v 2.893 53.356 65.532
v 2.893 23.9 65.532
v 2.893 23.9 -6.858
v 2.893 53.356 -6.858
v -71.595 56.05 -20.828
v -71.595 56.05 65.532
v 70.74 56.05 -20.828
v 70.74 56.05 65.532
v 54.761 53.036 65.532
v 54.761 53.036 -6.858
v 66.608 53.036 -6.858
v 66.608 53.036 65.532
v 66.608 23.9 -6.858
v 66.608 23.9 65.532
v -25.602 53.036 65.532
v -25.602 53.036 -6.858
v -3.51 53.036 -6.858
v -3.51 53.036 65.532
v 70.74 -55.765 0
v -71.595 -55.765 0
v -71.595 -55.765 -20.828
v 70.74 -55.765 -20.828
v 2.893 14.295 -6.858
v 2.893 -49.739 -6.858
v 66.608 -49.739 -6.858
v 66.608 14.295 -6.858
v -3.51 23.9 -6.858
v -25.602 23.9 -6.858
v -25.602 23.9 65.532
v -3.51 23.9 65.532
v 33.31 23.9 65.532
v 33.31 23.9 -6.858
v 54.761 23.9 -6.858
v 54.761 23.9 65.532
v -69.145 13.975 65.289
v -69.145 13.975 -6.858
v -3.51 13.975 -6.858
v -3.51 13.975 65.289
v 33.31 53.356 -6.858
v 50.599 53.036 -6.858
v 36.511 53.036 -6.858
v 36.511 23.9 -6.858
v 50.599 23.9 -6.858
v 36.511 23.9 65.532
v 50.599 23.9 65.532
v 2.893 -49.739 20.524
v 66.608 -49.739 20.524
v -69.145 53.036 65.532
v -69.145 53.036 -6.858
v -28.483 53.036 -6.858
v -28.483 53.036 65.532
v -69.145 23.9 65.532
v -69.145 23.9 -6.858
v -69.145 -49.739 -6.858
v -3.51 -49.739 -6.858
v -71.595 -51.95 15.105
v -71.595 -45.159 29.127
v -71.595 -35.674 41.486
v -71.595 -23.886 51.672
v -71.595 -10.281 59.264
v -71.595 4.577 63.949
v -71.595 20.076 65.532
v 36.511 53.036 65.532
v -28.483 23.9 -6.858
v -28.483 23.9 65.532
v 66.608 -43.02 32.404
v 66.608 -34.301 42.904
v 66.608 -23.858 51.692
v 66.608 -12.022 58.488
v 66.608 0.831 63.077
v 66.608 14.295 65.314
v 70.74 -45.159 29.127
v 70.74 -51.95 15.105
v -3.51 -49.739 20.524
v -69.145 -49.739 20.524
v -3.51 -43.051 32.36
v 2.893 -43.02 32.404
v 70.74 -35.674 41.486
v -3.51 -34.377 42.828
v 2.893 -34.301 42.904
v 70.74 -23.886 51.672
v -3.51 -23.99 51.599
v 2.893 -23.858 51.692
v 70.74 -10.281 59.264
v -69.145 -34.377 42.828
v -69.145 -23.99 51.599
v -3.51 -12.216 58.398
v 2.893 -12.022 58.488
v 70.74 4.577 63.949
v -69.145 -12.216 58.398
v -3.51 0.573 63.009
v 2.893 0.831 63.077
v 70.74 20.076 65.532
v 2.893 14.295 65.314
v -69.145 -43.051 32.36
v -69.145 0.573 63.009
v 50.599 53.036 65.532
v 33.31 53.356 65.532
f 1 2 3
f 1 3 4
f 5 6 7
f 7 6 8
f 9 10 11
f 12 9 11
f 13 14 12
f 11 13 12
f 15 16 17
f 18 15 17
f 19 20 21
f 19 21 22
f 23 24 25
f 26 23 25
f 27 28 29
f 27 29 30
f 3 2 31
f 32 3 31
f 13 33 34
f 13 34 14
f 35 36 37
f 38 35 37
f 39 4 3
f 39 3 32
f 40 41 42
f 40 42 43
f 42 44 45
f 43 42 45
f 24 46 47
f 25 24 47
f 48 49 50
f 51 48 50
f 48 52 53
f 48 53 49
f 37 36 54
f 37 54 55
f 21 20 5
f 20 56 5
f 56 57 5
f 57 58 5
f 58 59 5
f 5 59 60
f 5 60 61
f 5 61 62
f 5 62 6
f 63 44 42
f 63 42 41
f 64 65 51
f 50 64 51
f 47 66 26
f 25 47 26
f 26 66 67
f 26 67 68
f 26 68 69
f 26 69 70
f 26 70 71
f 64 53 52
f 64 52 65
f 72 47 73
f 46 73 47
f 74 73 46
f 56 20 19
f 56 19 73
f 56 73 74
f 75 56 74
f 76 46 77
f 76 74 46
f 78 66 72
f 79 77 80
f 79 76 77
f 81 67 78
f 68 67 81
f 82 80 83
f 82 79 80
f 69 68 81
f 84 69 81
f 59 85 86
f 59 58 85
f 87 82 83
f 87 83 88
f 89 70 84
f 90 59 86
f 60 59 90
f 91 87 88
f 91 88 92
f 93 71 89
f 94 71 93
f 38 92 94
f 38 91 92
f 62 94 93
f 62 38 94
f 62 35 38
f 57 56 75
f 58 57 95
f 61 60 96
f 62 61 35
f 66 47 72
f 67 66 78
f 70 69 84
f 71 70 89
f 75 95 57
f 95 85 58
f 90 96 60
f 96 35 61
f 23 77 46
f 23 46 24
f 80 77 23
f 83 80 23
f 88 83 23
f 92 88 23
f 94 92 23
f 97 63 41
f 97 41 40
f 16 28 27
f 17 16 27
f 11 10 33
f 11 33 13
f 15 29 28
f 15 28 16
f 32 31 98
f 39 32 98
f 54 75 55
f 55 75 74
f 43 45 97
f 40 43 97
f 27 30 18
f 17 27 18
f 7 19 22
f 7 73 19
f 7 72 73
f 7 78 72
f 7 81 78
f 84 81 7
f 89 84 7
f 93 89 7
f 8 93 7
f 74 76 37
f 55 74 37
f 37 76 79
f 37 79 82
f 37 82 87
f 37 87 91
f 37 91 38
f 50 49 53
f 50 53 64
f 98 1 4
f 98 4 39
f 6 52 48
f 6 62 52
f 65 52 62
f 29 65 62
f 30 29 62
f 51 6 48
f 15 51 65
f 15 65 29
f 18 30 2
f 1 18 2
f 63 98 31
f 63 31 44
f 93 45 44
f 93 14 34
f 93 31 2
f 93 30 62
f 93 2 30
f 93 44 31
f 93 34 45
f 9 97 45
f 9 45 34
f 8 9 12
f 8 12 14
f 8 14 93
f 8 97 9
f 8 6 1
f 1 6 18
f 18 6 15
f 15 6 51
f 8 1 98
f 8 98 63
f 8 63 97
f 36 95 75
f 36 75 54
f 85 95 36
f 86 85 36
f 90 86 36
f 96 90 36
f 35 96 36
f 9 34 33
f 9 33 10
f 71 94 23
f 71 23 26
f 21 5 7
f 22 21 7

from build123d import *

# Parameters (mm, degrees)
F0_W        = 142.3350870609
F0_H        = 111.8143312633
F1_DEPTH    = 65.532
F2_T1_DEPTH = 521.5375533391
F4_DEPTH    = 20.828
F3_W        = 65.6352208462
F3_H        = 63.7141903862
F3_W_2      = 63.7141834013
F3_H_2      = 64.0343613923
F3_W_3      = 30.4163205437
F3_H_3      = 29.4558089226
F3_W_4      = 22.0918541308
F3_H_4      = 29.1356351227
F3_W_5      = 14.0875652432
F3_W_6      = 11.8463523686
F3_W_7      = 40.6618192792
F5_DEPTH    = 72.39


# Not quite as in the source:
# - a fillet or chamfer that OpenCascade refuses, or shapes differently, is made with other operations: its cross-section is extruded or revolved along the edge and cut away or added


with BuildPart() as f1:
    # F0 (on Top) → F1 (new body)
    with BuildSketch(Plane.XY):
        with Locations((-0.4278570414, 0.1426208764)):
            Rectangle(F0_W, F0_H)
    extrude(amount=F1_DEPTH)

    # F2: fillet of radius 76.6512806053 on 1 edges, made by hand

    # F2_s2 → F2_t1 (cut)
    with BuildSketch(Plane.YZ.offset(-261.1966337109)):
        with BuildLine():
            ThreePointArc((-55.7645447552, 0), (-30.0394768726, 46.8795379871), (20.0759485004, 65.532))
            Line((20.0759485004, 65.532), (-55.7645447552, 65.532))
            Line((-55.7645447552, 65.532), (-55.7645447552, 0))
        make_face()
    extrude(amount=F2_T1_DEPTH, mode=Mode.SUBTRACT)

    # F4 (add): a face of the model
    f4_faces = [f1.faces().sort_by_distance(p)[0] for p in [
        (-0.4278570414, 0.1426208764, 0),
    ]]
    extrude(f4_faces, amount=F4_DEPTH)

    # F3 (on face) → F5 (cut)
    with BuildSketch(Plane.XY.offset(65.532)):
        with Locations((-36.3275922136, -17.8819601424)):
            Rectangle(F3_W, F3_H)
        with Locations((34.7505474929, -17.7218746394)):
            Rectangle(F3_W_2, F3_H_2)
        with Locations((18.1016160641, 38.6283630505)):
            Rectangle(F3_W_3, F3_H_3)
        with Locations((-14.555908856, 38.4682761505)):
            Rectangle(F3_W_4, F3_H_4)
        with Locations((43.5552746058, 38.4682761505)):
            Rectangle(F3_W_5, F3_H_4)
        with Locations((60.6844630092, 38.4682761505)):
            Rectangle(F3_W_6, F3_H_4)
        with Locations((-48.8142929971, 38.4682761505)):
            Rectangle(F3_W_7, F3_H_4)
    extrude(amount=-F5_DEPTH, mode=Mode.SUBTRACT)


solid = f1.part
